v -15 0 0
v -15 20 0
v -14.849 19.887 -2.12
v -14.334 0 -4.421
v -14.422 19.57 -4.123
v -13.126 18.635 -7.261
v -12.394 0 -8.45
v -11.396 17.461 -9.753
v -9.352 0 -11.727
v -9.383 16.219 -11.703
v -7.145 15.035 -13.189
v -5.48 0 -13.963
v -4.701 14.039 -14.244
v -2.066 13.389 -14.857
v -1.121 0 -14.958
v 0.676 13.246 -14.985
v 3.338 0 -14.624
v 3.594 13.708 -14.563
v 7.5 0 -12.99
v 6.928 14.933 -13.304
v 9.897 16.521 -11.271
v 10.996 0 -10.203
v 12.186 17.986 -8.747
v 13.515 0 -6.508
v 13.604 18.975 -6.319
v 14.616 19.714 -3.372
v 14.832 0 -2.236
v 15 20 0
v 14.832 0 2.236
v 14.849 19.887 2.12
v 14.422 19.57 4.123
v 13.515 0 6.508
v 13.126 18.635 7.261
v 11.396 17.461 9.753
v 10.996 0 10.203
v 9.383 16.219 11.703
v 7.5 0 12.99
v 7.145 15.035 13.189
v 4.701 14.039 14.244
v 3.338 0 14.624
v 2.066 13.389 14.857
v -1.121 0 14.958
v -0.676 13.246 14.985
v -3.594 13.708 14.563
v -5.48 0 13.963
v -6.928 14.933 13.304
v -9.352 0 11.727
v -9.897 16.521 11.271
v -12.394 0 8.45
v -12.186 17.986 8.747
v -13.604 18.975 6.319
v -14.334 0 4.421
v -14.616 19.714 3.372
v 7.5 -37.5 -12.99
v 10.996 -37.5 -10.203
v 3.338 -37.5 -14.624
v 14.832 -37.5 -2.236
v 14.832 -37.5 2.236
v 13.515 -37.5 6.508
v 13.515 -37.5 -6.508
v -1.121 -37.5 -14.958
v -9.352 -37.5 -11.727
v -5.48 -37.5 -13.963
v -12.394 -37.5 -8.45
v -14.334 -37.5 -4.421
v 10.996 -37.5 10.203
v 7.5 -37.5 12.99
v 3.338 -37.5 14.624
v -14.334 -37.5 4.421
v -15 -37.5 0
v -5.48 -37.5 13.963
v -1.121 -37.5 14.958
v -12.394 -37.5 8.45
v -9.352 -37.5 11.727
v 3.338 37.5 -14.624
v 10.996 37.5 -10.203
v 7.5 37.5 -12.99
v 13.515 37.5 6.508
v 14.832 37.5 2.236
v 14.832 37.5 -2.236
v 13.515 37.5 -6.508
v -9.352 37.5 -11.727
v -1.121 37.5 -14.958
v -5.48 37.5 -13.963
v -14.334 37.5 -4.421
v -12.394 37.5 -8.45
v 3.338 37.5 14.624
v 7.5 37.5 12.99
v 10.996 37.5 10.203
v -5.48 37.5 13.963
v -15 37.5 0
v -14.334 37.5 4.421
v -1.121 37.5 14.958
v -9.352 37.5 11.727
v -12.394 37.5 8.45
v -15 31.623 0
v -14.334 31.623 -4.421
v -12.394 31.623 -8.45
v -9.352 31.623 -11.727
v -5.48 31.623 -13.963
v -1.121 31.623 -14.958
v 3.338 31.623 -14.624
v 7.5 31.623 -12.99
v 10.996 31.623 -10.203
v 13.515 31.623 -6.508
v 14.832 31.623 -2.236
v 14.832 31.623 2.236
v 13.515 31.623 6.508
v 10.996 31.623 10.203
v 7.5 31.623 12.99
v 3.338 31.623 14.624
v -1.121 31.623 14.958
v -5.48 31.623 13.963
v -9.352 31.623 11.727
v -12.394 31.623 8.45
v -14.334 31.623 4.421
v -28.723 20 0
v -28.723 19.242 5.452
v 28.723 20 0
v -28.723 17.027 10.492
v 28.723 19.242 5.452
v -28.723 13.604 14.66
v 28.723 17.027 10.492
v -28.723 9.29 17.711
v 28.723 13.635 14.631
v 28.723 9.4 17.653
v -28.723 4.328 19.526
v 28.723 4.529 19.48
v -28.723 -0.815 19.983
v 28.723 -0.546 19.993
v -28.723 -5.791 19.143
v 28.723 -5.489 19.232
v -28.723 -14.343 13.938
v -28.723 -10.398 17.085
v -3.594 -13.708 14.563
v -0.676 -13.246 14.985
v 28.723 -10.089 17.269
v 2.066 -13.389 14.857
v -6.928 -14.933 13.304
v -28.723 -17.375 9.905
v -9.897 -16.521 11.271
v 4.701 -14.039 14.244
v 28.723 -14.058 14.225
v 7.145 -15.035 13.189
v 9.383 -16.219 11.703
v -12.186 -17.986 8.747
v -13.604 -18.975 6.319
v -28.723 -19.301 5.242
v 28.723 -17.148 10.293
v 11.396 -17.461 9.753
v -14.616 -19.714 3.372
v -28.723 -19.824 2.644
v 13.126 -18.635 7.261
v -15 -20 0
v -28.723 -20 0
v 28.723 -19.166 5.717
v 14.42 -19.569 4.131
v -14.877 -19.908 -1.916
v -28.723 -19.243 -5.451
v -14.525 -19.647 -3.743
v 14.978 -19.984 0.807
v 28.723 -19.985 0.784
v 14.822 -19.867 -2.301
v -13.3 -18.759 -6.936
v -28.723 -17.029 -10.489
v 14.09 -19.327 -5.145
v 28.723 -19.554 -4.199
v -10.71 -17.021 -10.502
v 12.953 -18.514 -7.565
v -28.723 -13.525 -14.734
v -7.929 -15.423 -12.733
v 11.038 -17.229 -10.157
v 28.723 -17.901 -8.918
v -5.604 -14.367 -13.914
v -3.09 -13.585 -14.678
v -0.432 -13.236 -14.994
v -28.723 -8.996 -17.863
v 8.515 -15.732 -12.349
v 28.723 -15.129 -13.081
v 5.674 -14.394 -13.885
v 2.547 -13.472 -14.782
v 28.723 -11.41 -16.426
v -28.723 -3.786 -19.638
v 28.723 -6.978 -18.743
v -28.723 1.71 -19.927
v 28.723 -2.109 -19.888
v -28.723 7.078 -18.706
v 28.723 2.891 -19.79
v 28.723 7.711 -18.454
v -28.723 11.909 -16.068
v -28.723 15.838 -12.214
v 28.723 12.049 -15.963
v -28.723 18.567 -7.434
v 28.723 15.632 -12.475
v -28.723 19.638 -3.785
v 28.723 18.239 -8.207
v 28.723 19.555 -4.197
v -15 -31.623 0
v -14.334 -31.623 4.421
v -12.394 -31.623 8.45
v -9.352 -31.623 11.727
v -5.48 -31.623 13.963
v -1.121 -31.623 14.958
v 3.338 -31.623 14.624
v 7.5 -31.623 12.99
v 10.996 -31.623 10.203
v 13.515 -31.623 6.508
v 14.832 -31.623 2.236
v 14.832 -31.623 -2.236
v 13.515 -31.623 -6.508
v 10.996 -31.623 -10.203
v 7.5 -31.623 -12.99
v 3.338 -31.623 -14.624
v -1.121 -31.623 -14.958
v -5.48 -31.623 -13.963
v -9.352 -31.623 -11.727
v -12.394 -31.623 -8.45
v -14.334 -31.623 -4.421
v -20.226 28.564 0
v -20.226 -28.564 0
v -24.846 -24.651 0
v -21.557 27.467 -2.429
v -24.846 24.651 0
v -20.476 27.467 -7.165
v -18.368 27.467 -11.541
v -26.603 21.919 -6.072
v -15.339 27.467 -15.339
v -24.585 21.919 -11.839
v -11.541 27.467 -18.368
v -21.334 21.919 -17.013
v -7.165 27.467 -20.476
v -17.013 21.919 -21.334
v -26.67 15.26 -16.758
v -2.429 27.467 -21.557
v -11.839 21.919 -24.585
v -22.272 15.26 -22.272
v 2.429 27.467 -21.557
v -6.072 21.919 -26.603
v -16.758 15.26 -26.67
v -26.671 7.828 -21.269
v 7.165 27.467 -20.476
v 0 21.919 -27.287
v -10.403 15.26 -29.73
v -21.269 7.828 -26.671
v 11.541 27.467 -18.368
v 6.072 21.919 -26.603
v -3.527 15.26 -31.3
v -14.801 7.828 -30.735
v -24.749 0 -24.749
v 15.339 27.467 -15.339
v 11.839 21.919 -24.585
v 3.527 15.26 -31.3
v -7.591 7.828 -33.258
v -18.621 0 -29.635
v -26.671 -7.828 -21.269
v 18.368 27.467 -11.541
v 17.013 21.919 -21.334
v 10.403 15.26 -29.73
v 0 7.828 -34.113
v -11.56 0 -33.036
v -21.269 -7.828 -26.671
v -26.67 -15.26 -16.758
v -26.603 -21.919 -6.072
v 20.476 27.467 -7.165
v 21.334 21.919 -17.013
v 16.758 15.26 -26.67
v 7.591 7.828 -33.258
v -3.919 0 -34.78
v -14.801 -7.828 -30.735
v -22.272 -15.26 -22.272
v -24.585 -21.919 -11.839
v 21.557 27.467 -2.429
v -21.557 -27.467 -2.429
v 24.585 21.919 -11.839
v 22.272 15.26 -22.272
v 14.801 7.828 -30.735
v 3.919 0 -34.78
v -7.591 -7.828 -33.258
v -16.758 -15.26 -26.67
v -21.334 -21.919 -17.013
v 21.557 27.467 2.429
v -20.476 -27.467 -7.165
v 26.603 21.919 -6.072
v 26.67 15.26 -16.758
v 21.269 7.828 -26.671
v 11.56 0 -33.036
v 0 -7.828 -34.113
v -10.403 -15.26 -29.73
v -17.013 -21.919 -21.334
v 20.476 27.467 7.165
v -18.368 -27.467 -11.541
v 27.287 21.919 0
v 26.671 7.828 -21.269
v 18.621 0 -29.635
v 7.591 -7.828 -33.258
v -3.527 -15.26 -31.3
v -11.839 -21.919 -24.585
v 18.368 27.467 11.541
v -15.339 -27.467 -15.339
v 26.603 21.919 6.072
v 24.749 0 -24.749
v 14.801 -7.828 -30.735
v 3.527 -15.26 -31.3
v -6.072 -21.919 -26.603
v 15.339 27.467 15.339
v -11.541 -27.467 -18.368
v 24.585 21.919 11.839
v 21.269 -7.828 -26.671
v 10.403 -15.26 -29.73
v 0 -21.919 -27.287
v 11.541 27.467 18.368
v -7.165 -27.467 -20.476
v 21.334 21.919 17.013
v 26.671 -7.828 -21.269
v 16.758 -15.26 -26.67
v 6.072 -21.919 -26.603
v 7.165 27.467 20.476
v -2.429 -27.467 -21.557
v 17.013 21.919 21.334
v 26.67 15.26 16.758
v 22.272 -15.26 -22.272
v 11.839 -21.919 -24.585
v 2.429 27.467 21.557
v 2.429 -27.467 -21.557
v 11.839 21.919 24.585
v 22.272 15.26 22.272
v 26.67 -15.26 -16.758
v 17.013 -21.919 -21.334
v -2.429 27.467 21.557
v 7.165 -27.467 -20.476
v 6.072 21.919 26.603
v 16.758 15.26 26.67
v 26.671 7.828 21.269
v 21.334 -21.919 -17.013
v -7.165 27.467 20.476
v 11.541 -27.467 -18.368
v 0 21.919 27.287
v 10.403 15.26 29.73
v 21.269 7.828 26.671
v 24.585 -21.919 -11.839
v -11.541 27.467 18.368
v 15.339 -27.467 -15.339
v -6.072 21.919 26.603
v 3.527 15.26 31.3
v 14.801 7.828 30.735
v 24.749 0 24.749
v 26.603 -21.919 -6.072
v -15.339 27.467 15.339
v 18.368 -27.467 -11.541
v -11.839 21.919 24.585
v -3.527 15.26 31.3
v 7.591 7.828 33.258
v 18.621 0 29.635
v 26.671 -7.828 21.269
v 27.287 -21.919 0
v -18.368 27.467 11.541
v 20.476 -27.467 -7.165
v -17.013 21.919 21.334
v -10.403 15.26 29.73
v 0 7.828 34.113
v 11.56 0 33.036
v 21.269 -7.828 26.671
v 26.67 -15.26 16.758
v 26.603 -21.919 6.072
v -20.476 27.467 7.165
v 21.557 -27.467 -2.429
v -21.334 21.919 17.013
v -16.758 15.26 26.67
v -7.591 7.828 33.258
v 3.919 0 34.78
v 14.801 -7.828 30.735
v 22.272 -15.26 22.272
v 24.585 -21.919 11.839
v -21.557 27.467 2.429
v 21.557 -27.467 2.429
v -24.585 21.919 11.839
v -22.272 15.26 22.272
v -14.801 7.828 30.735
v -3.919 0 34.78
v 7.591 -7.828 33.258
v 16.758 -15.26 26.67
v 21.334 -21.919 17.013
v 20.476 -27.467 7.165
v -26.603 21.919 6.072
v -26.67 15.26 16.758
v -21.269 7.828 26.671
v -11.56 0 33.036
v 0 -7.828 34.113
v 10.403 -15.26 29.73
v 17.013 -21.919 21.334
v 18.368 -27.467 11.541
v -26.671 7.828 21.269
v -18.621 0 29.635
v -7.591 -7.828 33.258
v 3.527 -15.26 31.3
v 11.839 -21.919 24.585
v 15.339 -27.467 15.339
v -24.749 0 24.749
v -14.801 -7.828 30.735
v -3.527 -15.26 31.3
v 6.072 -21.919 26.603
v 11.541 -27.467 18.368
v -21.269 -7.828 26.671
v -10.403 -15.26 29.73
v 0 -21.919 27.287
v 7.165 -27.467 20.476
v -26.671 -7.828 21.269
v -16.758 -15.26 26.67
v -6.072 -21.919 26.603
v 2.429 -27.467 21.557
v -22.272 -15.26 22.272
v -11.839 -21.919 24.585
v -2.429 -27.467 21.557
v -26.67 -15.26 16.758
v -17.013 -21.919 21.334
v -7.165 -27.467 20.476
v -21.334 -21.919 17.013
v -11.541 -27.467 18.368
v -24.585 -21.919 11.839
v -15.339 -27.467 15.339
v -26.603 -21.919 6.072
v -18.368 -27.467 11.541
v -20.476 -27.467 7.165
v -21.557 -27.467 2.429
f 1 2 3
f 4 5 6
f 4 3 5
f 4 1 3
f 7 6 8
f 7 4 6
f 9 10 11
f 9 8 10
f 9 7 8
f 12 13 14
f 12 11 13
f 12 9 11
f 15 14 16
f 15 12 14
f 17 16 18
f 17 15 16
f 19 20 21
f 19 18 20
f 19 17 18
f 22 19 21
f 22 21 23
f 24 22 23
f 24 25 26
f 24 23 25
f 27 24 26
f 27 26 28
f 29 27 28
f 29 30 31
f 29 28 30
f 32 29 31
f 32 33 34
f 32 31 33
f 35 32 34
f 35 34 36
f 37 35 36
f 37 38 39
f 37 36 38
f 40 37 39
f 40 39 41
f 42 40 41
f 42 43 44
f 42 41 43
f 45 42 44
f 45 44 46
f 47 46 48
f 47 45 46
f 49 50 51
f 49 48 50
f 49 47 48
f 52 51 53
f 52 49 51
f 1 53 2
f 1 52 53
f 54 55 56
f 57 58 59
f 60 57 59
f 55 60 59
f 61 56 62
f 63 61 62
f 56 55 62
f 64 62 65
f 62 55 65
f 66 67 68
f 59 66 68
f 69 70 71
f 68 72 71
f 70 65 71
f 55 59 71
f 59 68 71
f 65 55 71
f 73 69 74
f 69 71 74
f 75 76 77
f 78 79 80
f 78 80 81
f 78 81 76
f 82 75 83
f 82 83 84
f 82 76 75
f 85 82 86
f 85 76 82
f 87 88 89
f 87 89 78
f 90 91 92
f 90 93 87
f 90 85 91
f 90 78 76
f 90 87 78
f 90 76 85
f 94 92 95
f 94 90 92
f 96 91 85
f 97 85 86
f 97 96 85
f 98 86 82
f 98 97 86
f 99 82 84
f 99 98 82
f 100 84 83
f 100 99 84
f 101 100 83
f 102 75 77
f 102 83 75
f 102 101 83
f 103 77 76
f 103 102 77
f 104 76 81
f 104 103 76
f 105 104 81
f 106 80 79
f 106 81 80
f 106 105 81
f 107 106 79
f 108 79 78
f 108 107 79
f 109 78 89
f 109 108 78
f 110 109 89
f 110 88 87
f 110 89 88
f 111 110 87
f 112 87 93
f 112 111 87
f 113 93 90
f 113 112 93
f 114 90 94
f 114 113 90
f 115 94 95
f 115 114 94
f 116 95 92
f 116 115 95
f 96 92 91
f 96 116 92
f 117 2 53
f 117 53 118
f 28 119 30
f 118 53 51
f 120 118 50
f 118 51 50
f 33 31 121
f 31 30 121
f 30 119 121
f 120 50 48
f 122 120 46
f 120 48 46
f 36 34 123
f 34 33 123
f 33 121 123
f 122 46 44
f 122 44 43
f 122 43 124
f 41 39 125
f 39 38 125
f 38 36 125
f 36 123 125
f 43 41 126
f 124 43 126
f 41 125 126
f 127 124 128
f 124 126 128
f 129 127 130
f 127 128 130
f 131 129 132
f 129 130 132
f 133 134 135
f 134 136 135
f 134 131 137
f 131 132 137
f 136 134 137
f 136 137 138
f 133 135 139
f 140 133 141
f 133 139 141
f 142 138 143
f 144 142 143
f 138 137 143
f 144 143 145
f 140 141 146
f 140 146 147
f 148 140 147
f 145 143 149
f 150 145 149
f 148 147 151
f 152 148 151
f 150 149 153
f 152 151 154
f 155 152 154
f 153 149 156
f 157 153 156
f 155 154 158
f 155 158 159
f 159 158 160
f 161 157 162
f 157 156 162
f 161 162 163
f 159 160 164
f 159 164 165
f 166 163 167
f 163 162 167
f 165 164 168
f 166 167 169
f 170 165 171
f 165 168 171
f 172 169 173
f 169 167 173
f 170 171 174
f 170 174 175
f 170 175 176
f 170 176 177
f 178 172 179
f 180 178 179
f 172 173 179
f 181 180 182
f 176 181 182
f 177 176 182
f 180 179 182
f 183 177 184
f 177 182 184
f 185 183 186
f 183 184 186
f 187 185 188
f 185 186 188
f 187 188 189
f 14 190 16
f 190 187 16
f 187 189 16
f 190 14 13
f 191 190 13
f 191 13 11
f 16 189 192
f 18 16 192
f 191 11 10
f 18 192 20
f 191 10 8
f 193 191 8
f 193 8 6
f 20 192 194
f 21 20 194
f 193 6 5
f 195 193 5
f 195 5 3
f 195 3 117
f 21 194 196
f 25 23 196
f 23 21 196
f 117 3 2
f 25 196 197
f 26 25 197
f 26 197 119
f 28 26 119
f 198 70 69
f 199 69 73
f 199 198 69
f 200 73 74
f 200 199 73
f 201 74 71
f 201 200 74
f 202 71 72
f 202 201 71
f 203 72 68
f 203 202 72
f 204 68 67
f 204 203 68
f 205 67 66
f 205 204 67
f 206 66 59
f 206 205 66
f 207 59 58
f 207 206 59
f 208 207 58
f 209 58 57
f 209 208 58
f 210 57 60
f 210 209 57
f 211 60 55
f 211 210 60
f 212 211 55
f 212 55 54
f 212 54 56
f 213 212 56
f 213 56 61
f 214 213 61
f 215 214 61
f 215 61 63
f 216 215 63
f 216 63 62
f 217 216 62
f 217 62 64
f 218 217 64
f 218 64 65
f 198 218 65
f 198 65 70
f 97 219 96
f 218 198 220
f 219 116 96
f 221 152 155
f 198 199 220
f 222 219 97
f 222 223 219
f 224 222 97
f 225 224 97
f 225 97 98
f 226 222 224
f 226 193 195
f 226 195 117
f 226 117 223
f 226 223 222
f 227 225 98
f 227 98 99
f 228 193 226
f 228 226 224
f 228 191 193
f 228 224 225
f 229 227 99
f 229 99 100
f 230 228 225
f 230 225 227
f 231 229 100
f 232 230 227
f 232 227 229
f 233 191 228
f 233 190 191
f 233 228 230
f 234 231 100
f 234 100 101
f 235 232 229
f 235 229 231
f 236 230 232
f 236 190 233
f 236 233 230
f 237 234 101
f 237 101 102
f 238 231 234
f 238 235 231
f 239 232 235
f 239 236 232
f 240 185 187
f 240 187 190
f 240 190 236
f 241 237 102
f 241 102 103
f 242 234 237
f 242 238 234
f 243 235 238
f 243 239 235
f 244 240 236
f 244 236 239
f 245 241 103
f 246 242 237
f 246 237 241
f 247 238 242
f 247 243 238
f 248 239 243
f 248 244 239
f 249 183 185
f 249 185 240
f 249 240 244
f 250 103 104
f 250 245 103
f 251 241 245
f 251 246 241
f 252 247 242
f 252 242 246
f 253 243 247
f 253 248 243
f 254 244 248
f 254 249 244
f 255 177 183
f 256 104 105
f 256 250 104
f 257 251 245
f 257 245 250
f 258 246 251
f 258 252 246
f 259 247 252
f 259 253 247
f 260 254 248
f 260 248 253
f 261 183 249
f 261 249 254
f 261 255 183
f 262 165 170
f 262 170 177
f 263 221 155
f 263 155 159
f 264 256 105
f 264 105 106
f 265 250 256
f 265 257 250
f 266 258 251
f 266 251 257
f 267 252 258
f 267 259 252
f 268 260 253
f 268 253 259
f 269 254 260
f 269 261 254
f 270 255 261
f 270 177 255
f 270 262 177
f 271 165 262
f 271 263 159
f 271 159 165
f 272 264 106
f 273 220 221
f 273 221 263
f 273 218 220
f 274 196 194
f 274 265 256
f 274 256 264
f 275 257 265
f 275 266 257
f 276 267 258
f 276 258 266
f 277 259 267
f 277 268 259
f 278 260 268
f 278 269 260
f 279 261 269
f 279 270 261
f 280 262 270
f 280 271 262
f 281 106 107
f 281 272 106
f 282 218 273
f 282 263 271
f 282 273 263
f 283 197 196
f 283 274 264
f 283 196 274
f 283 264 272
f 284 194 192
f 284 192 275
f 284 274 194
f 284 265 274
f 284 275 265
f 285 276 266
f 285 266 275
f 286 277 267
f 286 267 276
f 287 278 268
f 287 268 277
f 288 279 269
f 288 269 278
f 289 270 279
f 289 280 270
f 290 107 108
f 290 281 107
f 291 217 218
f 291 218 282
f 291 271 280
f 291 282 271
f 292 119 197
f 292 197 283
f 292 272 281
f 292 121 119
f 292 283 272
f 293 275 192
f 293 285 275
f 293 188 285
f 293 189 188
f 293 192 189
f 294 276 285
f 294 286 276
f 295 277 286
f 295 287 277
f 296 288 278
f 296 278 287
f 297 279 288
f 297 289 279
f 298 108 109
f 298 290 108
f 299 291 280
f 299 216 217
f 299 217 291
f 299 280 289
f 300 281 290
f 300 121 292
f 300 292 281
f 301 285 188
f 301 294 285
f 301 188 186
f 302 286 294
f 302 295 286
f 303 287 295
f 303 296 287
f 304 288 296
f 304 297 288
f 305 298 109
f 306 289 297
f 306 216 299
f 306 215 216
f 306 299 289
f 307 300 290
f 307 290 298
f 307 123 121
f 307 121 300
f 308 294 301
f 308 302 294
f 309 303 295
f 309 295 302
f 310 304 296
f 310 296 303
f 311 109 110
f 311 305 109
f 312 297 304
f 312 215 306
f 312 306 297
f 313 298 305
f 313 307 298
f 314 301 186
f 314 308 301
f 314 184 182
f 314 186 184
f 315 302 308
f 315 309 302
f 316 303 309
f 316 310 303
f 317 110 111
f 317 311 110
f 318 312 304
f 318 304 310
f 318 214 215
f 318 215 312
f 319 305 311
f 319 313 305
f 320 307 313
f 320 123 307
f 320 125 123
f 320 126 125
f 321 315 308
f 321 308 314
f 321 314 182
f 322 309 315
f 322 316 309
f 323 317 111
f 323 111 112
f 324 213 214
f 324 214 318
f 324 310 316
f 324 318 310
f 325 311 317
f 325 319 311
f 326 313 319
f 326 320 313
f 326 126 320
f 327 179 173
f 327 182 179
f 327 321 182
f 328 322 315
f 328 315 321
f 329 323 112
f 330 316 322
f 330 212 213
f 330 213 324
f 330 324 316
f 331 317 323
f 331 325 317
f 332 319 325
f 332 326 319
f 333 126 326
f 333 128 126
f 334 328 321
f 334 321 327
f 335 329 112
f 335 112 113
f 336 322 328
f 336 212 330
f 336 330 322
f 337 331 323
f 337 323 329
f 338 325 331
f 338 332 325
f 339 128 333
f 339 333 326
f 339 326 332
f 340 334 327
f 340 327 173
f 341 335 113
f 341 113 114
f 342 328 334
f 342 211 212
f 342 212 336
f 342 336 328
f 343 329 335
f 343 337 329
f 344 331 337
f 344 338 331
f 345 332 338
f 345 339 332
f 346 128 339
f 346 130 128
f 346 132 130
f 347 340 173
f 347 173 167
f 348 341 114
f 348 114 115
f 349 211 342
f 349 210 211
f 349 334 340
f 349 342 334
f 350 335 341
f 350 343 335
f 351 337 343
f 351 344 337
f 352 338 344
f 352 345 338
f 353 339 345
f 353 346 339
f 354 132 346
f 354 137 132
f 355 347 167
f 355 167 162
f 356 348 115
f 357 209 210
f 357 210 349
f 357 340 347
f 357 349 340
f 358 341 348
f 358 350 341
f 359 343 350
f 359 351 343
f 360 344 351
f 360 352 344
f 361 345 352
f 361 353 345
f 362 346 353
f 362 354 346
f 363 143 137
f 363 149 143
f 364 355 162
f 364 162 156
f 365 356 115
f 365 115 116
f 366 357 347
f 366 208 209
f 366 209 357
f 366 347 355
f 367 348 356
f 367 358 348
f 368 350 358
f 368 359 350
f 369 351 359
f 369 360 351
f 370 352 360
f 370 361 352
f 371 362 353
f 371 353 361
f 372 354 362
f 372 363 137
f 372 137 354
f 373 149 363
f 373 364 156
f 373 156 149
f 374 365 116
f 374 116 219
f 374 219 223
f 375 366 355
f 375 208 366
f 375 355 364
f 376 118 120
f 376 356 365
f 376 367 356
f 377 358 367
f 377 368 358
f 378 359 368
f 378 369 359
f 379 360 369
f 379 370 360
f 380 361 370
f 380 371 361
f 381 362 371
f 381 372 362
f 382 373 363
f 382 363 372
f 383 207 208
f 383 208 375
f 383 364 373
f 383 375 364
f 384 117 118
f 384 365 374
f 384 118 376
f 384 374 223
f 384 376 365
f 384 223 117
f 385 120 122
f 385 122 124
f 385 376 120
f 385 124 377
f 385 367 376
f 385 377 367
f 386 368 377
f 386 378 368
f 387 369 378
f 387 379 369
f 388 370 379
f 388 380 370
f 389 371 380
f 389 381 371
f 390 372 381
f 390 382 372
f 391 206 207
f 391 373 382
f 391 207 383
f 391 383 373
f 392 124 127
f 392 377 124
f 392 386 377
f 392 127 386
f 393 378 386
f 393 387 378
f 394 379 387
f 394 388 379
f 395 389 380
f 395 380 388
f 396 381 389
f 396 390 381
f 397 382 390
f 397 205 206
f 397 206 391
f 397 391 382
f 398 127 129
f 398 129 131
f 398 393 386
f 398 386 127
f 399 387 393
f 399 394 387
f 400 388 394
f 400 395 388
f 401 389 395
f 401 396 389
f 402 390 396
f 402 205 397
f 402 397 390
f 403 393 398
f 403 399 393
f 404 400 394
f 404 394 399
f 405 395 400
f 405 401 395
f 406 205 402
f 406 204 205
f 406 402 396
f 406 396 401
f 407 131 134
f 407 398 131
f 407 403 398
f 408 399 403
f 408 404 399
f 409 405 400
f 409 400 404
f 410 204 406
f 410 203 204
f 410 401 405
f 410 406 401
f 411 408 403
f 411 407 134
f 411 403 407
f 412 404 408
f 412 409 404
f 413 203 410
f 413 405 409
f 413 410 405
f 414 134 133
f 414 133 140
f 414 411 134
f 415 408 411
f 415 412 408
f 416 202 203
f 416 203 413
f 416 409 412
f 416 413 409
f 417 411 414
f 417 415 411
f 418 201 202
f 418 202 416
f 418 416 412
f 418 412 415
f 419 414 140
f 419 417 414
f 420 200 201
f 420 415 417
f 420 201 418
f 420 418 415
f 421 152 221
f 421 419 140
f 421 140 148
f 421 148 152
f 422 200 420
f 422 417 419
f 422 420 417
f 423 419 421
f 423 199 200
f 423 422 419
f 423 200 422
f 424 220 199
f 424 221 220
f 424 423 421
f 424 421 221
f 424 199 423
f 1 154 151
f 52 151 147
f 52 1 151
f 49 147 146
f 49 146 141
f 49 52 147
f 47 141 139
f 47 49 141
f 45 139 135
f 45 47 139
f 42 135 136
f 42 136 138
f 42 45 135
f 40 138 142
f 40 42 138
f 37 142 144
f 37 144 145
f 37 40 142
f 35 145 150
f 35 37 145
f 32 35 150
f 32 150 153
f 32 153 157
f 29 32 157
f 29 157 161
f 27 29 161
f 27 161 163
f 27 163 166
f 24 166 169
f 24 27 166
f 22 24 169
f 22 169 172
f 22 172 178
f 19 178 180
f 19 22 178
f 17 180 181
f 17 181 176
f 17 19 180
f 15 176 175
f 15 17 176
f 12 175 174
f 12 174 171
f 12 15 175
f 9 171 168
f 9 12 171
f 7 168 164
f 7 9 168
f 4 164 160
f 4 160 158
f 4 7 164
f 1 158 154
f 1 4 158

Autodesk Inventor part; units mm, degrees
ref_plane "XY Plane" through (0, 0, 0) normal (0, 0, 1) x (1, 0, 0)
sketch "スケッチ1" plane through (0, 0, 0) normal (0, 0, 1) x (1, 0, 0)
  arc A0 (0, 35) -> (0, -35) centre (0, 0) ccw
  line L0 (0, 35) -> (0, -35)
  dimension "d0" = 70
revolve "回転1" add sketch "スケッチ1" angle 360 about axis through (0, 35, 0) along (0, -1, 0)
sketch "スケッチ2" plane through (0, 0, 0) normal (1, 0, 0) x (0, 1, 0)
  circle A0 centre (0, 0) radius 20
  dimension "d2" = 40
extrude "押し出し1" cut sketch "スケッチ2" along normal mid plane 100
sketch "スケッチ4" plane through (0, 0, 0) normal (0, 1, 0) x (-1, 0, 0)
  circle A0 centre (0, 0) radius 15
  dimension "d8" = 30
extrude "押し出し3" add sketch "スケッチ4" along normal mid plane 75
properties part number "FootR"
